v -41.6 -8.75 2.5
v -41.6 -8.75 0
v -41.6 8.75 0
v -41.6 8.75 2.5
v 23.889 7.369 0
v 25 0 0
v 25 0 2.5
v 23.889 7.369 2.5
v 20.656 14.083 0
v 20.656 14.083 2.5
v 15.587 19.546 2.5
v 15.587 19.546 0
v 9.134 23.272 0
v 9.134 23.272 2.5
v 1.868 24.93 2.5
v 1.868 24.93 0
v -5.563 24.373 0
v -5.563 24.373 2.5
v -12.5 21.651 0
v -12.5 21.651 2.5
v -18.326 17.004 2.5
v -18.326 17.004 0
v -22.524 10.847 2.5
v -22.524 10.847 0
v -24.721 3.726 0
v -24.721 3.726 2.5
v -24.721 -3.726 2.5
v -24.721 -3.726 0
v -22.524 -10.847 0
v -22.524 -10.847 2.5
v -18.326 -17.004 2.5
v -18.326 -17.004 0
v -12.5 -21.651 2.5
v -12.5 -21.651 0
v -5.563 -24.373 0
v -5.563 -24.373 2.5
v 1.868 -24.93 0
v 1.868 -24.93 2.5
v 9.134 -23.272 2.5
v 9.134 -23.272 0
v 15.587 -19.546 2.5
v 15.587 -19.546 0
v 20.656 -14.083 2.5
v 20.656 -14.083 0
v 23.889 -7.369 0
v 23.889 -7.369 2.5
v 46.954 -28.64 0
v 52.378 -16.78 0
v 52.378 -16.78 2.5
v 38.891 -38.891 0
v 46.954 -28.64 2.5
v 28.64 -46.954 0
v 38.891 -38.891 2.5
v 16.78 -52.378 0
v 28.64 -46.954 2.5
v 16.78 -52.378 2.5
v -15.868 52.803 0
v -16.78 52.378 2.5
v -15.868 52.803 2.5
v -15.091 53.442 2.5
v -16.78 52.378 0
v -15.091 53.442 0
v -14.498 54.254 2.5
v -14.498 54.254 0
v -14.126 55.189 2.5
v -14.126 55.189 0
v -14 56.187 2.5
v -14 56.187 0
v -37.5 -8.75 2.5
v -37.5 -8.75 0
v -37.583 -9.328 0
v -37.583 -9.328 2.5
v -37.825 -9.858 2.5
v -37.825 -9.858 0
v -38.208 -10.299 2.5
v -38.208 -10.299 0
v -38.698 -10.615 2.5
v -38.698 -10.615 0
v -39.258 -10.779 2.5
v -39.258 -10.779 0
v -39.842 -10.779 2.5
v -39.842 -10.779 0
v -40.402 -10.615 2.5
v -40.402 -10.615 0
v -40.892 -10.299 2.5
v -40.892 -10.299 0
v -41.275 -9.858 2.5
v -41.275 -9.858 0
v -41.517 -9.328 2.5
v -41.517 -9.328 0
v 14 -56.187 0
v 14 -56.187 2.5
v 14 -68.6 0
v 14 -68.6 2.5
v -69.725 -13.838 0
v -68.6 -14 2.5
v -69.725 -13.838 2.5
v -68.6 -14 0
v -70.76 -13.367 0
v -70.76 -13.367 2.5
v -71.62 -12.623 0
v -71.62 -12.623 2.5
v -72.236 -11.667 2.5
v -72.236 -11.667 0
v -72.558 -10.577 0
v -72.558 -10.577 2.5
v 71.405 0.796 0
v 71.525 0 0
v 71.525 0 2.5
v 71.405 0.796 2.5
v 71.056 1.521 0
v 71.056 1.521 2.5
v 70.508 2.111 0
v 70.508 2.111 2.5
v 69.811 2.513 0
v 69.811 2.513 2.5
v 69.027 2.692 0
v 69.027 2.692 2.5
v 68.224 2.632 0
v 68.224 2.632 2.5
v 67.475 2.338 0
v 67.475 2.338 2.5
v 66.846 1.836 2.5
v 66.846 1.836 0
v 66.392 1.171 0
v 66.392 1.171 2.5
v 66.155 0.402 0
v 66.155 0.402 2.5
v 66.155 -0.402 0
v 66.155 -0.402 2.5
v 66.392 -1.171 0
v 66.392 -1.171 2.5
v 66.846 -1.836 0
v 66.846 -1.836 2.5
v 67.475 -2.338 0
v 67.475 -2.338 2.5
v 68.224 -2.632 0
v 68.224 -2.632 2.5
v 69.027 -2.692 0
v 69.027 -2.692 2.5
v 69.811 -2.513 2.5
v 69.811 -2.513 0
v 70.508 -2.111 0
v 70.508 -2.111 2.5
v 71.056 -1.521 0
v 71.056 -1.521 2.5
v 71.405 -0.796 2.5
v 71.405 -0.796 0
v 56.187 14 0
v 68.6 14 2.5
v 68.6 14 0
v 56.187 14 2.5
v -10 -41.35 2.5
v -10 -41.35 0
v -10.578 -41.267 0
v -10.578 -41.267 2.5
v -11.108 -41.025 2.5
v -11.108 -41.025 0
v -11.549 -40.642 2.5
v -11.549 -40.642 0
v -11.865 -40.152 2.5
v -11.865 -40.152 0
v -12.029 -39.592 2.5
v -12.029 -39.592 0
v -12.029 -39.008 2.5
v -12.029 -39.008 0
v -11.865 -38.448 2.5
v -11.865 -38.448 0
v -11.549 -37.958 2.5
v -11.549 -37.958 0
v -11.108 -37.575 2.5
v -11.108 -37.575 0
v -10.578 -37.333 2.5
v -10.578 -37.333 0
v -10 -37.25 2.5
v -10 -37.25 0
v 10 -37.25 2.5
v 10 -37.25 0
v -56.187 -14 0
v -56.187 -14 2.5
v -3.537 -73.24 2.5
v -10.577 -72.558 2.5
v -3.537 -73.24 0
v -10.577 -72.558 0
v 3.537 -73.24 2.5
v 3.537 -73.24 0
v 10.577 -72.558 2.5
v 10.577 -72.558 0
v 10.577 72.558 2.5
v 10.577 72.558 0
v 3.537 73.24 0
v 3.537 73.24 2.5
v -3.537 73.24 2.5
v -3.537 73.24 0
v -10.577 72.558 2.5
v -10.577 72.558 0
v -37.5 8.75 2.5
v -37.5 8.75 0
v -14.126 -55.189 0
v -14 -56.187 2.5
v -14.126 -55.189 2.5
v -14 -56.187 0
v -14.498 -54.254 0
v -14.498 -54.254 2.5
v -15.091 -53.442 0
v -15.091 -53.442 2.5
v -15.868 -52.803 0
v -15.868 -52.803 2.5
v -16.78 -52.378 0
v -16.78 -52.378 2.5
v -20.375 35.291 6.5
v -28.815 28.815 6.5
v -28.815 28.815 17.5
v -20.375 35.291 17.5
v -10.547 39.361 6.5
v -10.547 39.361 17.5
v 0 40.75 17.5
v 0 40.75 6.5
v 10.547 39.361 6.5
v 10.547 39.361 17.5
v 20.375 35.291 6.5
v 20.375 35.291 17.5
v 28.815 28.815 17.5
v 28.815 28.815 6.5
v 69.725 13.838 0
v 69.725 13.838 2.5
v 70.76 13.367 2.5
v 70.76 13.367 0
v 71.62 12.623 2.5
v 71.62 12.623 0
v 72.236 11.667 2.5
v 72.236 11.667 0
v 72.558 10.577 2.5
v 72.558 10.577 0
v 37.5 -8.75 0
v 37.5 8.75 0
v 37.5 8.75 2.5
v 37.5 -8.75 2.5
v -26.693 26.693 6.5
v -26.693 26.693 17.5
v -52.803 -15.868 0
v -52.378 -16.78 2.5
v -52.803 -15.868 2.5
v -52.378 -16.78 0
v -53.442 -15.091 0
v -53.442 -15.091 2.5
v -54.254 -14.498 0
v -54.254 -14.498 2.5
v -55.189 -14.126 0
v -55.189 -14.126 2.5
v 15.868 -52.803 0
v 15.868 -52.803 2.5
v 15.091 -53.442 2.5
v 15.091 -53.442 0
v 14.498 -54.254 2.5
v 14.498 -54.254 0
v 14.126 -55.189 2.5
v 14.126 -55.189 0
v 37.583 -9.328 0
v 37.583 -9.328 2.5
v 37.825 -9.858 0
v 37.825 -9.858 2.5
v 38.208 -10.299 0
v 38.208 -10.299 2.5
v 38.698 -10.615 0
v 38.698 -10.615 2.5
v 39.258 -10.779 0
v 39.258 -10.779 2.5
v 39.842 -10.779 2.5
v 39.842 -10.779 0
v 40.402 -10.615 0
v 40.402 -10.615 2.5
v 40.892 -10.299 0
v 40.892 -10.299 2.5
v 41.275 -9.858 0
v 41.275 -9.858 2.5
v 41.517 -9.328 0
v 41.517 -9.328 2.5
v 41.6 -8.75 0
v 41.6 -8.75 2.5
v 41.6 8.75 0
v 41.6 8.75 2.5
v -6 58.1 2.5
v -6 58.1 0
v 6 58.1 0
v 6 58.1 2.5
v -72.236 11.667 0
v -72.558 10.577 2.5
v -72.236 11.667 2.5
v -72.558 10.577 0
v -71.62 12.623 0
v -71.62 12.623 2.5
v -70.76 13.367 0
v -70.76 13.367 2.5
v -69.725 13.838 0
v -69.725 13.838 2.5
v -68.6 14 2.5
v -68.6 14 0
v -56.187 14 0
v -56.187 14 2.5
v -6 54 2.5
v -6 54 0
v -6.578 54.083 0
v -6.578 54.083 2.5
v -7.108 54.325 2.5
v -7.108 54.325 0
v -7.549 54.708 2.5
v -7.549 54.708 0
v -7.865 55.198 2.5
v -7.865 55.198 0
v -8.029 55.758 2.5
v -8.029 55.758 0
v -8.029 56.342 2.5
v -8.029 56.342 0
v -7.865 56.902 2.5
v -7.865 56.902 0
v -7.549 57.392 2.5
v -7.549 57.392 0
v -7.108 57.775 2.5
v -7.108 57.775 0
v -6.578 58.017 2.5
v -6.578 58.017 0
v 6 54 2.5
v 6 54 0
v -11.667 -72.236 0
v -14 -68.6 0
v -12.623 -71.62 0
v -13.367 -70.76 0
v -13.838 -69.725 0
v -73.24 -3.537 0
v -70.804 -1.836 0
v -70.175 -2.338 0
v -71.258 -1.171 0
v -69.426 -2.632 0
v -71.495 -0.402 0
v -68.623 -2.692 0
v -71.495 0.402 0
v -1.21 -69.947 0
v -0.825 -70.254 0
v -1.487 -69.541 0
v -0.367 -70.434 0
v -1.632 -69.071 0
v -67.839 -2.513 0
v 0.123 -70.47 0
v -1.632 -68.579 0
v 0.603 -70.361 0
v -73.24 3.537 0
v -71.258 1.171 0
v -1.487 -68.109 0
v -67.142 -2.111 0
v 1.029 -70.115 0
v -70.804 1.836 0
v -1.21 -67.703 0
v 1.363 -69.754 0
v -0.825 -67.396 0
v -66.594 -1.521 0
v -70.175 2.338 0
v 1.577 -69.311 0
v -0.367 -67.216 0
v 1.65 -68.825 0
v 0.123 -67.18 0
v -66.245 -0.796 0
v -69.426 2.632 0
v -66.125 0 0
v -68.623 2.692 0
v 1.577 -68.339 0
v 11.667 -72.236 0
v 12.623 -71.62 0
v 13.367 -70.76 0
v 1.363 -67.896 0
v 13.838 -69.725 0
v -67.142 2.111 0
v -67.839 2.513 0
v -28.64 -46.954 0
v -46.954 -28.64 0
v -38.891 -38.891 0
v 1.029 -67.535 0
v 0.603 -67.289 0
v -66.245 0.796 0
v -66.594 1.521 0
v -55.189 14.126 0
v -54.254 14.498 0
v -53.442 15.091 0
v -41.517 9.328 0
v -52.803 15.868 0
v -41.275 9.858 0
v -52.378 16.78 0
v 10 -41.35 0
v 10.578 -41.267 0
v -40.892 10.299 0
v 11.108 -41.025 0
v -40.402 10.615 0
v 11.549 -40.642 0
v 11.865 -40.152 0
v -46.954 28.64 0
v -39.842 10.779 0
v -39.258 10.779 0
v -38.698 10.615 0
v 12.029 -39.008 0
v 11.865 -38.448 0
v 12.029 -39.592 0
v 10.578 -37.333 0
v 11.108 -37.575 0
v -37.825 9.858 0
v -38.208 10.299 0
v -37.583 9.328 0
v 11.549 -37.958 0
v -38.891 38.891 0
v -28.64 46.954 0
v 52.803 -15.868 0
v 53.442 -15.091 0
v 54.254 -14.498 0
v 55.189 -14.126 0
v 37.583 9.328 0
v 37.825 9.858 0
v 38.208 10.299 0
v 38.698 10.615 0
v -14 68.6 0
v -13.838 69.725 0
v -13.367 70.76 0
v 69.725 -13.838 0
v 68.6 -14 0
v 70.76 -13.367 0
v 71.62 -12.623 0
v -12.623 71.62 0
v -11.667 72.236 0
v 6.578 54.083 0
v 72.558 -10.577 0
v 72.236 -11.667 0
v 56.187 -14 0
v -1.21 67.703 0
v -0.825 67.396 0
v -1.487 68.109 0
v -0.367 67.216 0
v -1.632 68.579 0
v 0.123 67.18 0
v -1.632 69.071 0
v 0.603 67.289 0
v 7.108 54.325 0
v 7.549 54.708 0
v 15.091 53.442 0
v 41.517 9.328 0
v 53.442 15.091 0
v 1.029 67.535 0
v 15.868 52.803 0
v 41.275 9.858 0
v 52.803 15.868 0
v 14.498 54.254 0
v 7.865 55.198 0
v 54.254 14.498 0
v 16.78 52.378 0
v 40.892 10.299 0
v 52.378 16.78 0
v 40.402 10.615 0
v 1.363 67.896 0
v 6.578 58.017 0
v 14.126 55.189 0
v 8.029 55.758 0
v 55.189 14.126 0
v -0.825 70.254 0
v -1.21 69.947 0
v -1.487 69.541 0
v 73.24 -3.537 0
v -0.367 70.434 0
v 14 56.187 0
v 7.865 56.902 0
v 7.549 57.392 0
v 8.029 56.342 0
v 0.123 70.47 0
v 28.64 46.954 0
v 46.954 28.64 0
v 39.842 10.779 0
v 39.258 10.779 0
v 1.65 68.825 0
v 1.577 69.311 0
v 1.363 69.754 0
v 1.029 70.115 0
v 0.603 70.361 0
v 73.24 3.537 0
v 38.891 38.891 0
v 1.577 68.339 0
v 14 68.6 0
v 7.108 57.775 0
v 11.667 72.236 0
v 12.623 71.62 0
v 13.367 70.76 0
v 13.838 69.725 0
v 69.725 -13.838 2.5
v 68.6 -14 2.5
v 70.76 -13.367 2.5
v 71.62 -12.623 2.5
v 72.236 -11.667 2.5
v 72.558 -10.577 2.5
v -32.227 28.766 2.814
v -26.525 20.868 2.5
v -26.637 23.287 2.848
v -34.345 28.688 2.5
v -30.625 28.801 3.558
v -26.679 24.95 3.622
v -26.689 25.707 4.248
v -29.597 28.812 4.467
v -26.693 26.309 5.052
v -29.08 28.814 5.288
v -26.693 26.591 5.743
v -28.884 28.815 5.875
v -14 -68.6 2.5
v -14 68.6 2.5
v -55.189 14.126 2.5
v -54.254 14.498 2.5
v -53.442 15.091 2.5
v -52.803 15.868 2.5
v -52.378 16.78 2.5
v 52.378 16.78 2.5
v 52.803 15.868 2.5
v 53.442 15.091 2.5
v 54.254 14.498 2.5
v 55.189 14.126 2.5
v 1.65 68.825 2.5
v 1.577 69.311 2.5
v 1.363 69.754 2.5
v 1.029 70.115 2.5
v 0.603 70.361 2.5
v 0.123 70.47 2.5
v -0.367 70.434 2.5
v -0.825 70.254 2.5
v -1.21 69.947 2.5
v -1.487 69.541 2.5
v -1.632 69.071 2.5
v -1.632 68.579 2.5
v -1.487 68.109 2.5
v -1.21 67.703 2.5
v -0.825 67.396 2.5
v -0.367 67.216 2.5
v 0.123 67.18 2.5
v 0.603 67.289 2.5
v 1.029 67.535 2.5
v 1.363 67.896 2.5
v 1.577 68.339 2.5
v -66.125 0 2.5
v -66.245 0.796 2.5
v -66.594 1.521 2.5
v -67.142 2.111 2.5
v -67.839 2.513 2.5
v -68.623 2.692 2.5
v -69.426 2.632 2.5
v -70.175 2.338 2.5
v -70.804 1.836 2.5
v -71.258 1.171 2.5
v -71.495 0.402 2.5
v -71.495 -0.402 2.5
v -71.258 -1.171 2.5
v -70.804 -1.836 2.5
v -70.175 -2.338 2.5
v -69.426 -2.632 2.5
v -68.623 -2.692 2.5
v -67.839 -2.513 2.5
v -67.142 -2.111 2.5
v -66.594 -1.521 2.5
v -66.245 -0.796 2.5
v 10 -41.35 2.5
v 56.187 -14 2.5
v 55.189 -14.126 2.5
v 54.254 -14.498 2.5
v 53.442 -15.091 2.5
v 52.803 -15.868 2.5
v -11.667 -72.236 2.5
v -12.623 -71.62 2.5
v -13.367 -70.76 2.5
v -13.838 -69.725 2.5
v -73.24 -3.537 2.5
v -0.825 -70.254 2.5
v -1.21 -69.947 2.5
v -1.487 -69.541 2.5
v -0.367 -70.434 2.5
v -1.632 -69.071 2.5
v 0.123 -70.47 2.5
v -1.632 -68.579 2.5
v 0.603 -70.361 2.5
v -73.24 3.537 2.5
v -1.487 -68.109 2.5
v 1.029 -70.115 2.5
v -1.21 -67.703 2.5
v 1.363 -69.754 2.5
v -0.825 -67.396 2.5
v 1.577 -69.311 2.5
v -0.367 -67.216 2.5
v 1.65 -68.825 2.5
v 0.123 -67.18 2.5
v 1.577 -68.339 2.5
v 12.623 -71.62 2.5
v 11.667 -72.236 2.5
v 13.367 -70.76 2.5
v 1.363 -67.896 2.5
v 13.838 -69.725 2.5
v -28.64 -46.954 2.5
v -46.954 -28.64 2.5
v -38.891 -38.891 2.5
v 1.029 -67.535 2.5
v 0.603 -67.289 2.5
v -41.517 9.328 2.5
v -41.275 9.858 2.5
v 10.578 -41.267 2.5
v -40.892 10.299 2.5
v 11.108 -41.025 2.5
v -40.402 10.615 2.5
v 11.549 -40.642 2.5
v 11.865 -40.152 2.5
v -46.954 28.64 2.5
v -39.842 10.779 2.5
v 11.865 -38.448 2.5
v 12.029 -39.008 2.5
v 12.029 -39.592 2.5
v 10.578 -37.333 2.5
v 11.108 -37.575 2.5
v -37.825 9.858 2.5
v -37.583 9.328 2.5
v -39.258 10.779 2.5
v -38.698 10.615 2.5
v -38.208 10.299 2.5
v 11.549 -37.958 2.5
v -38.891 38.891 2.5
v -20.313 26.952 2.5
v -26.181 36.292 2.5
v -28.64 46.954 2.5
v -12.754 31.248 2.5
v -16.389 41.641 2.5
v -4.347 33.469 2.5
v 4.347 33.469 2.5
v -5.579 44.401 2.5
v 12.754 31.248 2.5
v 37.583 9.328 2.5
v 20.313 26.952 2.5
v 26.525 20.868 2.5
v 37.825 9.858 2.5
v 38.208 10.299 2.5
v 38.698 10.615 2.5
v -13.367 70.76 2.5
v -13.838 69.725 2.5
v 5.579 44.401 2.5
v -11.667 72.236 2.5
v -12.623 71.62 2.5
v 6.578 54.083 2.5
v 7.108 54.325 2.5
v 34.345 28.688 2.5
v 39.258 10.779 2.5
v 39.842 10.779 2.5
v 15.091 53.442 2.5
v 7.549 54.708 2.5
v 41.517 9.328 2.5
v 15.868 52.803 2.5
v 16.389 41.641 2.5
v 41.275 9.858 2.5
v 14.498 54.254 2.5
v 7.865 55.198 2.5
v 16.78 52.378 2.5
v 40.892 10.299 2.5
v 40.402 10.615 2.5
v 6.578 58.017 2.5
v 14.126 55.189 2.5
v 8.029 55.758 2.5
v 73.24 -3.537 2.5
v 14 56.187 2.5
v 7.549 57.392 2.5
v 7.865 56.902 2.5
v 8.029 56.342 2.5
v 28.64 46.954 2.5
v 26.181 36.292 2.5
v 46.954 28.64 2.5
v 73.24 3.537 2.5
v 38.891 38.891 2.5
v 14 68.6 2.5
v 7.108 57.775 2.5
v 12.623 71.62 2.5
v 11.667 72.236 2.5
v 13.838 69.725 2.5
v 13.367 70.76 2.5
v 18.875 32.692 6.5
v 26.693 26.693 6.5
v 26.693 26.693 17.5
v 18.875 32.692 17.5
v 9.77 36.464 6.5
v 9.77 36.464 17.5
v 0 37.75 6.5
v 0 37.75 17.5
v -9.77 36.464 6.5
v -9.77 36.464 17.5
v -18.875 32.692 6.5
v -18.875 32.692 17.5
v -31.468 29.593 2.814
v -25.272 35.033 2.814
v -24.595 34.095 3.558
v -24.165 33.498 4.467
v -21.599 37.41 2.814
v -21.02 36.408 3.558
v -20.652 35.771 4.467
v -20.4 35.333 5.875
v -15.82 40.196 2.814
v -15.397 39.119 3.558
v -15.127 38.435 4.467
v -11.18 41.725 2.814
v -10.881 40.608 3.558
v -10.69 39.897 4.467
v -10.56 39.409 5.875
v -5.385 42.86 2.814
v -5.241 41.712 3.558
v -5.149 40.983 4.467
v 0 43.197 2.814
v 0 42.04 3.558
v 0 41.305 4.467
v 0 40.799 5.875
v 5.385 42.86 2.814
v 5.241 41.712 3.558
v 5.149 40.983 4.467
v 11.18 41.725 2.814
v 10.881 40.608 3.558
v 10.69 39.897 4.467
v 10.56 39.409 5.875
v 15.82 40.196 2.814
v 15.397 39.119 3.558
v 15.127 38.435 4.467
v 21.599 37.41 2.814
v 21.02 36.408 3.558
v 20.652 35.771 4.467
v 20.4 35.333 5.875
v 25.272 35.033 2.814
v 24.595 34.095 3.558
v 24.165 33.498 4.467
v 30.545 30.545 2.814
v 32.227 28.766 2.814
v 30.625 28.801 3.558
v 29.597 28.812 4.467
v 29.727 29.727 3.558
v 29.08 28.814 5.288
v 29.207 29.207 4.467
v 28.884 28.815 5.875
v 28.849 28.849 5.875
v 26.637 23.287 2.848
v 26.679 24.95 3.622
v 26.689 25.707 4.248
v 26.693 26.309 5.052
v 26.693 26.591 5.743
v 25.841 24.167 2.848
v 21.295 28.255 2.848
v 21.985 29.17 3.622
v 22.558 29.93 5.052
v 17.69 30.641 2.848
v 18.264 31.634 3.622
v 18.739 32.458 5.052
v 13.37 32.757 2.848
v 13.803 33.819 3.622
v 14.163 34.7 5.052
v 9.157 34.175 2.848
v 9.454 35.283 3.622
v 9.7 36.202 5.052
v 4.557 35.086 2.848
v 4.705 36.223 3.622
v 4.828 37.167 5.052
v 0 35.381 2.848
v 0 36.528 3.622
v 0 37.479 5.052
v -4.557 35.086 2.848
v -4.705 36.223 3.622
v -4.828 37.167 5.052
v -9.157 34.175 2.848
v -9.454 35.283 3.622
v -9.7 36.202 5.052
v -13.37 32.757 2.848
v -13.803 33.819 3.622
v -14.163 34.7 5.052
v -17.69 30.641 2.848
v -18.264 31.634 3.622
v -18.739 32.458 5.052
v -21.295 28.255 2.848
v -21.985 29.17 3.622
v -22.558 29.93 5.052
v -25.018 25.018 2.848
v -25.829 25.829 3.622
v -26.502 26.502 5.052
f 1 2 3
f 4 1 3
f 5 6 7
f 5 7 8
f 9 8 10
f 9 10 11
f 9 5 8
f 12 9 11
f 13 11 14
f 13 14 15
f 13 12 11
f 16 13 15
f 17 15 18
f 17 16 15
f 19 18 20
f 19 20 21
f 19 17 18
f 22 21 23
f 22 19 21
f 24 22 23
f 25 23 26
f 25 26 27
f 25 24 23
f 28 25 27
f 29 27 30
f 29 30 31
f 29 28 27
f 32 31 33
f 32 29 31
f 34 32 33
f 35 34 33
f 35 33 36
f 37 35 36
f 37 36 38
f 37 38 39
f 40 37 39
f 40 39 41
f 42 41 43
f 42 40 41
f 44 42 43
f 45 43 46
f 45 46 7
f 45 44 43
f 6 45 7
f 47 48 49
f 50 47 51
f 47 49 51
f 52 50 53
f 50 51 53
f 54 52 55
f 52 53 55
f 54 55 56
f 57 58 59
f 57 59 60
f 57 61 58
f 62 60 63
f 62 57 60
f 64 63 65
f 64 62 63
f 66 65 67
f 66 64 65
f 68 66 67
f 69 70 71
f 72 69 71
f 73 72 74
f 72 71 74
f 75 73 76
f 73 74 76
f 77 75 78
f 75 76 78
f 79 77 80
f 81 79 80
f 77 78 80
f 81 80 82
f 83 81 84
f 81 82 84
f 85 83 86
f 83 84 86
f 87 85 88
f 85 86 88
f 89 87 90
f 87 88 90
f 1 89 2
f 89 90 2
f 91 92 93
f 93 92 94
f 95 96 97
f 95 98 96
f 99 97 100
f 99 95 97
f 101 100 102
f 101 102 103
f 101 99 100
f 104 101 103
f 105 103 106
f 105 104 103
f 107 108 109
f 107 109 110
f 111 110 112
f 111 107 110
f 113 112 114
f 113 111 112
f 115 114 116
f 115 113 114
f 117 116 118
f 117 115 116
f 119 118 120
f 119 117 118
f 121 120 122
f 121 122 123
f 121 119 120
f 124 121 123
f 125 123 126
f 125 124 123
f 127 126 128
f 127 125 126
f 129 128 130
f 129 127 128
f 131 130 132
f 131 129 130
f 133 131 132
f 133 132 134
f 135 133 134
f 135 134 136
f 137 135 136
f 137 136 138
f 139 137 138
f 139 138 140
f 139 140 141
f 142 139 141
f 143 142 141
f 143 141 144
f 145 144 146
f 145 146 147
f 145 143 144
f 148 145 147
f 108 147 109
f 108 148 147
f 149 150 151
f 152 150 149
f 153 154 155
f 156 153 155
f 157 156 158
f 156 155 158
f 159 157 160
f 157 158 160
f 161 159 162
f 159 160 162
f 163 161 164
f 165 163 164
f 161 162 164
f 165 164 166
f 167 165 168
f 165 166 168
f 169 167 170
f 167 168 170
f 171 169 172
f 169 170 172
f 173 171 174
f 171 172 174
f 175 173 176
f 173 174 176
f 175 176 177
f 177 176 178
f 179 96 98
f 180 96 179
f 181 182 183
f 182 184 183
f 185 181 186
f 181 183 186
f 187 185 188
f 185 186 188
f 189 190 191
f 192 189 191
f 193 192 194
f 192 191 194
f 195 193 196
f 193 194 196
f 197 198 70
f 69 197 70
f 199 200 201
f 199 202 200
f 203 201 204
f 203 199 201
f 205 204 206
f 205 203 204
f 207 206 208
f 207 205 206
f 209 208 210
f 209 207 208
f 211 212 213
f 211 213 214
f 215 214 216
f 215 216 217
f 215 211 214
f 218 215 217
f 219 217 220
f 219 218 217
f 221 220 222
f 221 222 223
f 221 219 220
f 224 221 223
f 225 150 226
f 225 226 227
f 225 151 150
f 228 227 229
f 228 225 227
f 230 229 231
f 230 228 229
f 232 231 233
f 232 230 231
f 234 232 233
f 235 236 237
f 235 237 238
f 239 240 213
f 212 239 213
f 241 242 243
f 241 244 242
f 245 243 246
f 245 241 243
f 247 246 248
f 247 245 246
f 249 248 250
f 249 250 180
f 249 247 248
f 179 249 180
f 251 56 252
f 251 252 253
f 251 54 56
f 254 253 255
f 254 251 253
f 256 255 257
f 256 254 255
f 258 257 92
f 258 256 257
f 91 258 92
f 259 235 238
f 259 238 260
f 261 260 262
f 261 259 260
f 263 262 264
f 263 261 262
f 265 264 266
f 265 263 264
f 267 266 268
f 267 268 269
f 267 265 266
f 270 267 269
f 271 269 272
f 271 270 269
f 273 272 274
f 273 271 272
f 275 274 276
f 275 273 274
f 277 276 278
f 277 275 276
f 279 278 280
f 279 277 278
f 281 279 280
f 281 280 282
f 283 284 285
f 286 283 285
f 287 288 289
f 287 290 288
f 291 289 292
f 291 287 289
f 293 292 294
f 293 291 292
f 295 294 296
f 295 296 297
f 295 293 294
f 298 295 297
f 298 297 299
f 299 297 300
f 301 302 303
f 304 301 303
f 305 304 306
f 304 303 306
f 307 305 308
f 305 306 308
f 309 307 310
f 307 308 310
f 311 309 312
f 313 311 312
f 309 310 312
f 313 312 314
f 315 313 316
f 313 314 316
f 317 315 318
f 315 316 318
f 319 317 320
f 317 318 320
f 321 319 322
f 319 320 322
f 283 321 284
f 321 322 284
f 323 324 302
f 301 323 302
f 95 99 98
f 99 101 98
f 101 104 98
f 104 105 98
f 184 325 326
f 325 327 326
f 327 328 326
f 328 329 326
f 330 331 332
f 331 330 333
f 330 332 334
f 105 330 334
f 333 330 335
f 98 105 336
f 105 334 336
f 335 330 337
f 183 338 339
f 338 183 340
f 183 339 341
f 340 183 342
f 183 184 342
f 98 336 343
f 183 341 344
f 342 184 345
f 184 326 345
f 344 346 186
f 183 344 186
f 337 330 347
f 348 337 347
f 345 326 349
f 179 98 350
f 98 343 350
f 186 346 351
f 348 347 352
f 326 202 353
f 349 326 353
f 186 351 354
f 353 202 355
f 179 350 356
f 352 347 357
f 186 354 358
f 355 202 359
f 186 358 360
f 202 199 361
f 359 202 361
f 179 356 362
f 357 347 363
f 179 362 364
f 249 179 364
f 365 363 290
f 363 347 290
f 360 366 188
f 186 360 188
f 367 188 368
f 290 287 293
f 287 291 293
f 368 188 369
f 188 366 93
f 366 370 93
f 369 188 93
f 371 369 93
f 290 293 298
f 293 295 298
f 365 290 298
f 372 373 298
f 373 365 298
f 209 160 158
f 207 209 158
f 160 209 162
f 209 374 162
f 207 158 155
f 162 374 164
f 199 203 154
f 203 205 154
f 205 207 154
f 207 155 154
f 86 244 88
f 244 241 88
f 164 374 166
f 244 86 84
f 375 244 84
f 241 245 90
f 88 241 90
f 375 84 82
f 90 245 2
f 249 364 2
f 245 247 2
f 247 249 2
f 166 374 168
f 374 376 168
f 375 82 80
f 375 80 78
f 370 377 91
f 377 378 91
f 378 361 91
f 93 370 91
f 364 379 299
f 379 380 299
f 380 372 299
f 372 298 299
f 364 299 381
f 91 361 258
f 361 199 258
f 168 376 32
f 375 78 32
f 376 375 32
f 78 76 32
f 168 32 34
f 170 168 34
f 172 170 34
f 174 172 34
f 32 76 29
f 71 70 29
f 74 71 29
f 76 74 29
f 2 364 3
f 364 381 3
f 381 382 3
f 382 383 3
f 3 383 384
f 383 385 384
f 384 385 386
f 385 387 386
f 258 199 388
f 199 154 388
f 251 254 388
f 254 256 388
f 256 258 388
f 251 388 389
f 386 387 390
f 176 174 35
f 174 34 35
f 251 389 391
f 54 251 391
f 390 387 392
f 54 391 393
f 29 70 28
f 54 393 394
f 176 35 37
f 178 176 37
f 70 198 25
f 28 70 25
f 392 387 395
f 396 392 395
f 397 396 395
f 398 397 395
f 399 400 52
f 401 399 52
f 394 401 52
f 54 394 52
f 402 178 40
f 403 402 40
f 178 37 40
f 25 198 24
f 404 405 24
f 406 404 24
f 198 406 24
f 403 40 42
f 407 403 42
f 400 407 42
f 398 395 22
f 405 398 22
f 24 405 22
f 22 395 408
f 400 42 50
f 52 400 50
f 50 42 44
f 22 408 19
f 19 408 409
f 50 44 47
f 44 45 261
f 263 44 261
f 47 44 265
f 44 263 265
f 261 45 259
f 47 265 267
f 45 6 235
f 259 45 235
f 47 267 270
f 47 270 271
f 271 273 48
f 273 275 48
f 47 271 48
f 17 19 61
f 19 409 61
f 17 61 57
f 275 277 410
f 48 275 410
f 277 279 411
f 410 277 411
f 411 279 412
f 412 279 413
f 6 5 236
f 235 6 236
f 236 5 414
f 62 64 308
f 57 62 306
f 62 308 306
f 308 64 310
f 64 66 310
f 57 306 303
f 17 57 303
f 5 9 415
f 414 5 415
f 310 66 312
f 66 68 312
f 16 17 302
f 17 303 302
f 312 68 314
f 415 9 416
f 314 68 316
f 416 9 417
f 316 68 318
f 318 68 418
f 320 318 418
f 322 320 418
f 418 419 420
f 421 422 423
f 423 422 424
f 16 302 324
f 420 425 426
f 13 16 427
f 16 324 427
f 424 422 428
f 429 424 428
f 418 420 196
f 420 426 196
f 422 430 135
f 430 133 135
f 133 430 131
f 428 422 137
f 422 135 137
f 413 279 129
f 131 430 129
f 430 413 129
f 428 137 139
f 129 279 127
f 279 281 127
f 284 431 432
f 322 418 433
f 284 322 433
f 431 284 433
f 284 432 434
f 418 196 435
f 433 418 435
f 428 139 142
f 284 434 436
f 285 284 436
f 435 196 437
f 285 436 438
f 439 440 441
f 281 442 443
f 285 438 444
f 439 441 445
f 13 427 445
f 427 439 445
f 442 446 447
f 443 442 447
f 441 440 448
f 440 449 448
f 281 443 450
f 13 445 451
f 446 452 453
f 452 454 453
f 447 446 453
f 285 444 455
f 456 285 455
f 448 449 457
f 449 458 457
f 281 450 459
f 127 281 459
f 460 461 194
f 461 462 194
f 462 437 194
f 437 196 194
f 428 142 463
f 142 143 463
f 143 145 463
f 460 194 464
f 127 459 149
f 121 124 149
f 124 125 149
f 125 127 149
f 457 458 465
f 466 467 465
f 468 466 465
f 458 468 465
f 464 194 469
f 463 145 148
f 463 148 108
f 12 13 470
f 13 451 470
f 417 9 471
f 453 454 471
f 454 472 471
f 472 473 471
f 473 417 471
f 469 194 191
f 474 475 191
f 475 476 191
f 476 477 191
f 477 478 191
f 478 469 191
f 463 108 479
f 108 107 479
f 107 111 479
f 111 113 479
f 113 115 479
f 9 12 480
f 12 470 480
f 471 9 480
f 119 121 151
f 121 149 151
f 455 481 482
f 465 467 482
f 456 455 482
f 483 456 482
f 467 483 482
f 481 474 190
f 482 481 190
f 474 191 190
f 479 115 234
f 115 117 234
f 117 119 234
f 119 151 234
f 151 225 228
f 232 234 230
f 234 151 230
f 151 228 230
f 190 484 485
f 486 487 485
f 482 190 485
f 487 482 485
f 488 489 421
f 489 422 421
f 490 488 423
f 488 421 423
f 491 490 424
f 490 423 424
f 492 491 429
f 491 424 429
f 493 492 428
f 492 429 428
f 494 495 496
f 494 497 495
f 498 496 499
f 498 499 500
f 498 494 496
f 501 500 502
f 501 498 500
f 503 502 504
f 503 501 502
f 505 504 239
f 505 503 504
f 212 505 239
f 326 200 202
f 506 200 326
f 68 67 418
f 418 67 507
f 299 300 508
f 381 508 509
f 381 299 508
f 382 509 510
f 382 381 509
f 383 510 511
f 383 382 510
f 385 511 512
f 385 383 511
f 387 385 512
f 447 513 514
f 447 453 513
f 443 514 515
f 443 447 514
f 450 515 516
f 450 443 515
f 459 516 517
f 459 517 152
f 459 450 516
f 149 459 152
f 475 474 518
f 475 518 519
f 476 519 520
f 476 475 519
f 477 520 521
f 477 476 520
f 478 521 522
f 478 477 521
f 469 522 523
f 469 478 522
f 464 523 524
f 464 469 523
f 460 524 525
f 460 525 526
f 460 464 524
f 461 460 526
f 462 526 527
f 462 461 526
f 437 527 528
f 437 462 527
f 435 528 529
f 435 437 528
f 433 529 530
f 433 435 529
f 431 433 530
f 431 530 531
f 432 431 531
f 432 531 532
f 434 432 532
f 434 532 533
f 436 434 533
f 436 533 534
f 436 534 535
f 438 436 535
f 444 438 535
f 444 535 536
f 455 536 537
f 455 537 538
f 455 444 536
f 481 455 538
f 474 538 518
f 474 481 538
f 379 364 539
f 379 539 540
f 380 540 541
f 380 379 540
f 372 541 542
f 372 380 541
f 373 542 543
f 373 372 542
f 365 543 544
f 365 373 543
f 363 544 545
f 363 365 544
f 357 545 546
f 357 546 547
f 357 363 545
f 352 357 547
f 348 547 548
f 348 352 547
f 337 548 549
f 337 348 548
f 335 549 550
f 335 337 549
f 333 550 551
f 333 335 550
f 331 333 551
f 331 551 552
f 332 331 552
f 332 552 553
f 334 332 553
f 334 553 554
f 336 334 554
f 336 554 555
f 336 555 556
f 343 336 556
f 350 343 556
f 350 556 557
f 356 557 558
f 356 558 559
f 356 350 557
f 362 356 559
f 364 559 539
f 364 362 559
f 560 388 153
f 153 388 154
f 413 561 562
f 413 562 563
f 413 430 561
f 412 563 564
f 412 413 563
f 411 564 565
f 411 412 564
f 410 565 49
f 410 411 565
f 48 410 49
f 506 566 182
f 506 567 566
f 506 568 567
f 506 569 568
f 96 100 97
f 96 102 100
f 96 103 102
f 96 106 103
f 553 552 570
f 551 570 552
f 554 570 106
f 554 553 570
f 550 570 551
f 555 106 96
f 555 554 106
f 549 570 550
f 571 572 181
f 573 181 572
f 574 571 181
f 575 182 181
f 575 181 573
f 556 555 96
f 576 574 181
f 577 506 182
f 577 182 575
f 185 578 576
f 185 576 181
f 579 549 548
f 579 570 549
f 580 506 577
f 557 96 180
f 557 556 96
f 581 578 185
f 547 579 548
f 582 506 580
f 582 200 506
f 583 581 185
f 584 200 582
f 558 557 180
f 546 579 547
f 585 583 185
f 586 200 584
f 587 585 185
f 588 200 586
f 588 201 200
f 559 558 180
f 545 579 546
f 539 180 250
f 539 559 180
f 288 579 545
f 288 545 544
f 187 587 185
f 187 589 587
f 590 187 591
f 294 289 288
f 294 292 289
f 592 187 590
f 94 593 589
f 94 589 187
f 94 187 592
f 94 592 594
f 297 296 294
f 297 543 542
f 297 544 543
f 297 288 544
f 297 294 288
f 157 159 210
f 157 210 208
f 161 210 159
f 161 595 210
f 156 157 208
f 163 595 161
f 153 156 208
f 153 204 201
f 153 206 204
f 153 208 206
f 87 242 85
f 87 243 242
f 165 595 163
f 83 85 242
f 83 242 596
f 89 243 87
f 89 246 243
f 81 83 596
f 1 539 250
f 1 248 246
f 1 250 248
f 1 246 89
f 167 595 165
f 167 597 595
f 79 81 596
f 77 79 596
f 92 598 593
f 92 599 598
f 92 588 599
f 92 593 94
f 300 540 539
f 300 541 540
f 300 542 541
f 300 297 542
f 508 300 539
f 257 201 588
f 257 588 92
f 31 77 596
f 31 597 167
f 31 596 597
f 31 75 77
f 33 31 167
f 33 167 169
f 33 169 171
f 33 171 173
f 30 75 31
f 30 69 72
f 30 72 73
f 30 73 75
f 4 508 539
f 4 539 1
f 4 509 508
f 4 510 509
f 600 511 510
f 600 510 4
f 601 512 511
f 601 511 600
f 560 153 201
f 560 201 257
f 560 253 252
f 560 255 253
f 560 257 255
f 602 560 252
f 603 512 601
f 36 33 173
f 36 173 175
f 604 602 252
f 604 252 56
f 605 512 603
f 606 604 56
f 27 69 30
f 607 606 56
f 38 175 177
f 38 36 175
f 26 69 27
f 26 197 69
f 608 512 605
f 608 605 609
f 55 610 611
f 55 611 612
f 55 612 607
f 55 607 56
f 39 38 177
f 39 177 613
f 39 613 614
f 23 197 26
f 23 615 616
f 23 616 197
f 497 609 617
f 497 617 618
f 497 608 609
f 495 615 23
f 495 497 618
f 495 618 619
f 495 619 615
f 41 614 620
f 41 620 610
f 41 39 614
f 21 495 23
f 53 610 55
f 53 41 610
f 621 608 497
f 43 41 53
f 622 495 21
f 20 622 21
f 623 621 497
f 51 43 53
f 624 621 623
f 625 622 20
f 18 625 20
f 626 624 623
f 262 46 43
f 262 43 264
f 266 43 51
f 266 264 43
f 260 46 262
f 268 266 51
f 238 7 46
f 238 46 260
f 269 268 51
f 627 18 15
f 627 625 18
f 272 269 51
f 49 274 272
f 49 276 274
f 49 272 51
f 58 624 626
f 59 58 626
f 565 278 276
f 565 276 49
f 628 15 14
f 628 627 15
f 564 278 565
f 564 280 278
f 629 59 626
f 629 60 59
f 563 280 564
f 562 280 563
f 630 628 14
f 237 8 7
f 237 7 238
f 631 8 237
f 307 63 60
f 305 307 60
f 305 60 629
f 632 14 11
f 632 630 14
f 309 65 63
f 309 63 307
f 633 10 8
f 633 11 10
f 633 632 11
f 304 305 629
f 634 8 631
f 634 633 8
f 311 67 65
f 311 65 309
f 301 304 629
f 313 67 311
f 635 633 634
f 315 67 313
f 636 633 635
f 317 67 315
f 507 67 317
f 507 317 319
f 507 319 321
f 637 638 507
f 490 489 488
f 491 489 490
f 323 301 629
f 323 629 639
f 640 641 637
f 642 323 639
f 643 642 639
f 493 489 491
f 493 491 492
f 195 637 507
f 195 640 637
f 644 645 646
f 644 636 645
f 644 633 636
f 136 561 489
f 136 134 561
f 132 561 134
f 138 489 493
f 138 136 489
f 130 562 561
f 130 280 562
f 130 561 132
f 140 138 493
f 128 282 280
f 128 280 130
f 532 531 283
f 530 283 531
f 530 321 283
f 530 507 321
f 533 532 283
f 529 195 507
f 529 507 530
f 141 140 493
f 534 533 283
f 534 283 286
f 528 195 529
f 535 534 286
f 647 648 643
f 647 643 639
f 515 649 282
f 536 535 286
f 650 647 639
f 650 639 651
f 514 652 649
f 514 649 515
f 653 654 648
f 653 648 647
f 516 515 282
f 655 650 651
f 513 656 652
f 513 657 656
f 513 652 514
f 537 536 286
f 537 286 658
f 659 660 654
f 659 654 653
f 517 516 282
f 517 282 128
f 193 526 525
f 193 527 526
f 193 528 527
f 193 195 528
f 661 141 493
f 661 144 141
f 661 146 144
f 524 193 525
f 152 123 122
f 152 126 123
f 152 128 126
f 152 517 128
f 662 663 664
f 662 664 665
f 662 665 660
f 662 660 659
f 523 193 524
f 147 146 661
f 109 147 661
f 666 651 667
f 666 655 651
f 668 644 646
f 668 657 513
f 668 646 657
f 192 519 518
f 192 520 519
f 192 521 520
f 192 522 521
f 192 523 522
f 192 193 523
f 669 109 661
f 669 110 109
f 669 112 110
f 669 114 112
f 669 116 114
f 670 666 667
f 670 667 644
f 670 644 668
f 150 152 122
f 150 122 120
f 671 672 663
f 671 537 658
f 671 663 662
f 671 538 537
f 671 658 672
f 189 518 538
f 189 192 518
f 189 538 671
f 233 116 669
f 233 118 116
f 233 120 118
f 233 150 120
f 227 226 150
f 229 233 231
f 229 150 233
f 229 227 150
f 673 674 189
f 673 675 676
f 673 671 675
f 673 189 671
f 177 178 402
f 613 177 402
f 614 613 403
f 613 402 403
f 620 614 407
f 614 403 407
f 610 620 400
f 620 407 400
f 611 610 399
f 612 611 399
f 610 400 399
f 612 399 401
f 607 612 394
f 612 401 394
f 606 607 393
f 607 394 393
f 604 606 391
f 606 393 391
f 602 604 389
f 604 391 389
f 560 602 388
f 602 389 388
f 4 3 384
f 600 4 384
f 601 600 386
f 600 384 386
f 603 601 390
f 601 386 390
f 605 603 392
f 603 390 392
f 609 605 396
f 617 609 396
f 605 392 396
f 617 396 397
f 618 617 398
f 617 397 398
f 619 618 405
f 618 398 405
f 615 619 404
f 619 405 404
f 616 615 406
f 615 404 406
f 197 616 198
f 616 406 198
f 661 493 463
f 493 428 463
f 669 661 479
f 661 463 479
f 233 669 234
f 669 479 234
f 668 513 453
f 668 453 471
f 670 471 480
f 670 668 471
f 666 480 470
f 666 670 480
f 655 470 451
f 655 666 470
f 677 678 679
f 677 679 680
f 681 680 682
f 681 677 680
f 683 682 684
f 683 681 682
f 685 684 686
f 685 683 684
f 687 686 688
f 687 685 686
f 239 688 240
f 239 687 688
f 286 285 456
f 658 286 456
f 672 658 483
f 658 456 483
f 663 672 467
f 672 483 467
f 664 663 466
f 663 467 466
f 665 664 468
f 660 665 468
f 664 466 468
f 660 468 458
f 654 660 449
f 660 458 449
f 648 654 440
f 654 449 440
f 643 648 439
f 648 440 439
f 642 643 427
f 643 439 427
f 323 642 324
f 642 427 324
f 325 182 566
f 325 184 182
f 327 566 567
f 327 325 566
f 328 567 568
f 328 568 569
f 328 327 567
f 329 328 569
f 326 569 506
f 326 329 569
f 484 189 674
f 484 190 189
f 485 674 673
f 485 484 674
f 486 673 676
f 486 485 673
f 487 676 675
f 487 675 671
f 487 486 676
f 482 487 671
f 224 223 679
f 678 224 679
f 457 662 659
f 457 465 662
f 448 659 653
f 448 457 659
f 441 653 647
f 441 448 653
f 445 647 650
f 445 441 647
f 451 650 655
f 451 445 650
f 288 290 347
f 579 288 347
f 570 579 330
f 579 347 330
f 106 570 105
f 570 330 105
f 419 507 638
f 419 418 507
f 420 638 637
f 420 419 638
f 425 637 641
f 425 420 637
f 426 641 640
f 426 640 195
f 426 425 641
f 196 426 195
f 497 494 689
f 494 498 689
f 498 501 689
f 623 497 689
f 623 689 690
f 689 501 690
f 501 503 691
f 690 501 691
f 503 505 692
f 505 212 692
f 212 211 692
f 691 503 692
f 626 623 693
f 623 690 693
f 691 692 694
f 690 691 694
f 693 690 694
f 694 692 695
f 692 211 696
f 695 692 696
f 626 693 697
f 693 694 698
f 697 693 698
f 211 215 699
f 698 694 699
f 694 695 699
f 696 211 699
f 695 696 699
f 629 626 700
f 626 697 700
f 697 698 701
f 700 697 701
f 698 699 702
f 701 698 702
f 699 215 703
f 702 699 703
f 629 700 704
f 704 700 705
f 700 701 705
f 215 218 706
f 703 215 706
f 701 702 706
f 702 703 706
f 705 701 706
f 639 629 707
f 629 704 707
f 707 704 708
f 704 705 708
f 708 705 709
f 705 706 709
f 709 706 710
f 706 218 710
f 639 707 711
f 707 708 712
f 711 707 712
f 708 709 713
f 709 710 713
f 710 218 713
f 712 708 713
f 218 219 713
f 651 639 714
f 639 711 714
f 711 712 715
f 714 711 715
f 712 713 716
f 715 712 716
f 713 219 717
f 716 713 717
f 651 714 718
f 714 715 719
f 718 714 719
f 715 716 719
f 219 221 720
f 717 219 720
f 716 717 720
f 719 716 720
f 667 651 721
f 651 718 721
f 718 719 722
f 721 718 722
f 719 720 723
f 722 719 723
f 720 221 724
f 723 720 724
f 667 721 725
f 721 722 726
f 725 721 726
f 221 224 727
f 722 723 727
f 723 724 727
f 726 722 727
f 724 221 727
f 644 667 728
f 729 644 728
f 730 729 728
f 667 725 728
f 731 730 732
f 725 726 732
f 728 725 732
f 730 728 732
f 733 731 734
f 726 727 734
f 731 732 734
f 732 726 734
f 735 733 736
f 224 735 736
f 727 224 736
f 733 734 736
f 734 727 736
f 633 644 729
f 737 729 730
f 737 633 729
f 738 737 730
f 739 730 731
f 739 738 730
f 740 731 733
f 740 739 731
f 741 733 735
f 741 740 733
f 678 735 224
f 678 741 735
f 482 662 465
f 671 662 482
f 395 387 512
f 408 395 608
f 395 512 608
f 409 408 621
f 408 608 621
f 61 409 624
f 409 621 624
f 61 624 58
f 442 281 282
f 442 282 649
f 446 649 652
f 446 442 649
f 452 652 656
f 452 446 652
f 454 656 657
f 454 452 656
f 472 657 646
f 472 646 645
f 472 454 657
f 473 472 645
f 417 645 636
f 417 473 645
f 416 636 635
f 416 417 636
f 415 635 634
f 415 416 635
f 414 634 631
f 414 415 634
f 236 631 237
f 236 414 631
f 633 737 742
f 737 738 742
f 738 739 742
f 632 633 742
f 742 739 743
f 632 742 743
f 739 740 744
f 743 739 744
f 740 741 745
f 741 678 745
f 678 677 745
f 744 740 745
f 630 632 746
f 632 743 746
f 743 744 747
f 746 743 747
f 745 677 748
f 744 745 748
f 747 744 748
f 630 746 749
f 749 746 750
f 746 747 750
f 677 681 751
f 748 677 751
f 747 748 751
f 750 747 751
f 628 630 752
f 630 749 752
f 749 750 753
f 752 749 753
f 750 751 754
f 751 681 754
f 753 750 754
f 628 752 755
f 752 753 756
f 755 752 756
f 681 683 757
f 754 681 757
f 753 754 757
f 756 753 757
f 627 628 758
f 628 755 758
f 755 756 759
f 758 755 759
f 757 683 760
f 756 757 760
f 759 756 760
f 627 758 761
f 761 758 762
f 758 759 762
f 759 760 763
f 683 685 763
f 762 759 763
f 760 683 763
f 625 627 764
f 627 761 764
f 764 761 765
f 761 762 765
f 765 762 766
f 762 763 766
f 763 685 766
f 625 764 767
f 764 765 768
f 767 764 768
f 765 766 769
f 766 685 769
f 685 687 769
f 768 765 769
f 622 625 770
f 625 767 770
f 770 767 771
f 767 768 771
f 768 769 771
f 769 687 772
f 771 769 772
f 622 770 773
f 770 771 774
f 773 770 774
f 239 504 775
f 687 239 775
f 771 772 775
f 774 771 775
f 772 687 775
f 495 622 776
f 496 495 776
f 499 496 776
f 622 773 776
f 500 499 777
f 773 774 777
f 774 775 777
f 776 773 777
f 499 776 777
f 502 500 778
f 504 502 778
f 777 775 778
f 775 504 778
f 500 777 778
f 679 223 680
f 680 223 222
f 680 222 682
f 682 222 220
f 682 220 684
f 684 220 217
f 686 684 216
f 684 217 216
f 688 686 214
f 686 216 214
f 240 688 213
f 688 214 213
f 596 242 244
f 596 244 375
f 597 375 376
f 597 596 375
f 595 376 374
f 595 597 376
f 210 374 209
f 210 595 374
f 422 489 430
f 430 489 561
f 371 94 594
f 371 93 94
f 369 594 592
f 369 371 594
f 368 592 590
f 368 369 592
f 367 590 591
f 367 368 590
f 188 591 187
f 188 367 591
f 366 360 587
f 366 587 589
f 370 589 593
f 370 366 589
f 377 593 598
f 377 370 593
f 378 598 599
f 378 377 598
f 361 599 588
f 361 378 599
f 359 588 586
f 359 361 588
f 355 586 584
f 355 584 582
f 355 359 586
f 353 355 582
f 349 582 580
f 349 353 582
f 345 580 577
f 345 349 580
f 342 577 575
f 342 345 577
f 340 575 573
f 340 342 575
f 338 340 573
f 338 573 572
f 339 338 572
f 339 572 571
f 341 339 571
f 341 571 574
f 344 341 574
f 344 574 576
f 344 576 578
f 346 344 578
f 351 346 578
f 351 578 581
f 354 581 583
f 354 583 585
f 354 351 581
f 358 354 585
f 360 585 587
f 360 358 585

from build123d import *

# Parameters (mm, degrees)
SKETCH1_R           = 73.325
SKETCH1_R_2         = 1.65
SKETCH1_R_3         = 2.7
SKETCH1_R_4         = 25
BOSS_EXTRUDE1_DEPTH = 2.5
BOSS_EXTRUDE2_DEPTH = 15
FILLET2_R           = 4
CUT_EXTRUDE1_DEPTH  = 105.776482333
FILLET1_R           = 4


with BuildPart() as part:
    # Sketch1 → Boss-Extrude1 (new body)
    with BuildSketch(Plane.XY):
        Circle(SKETCH1_R)
        with Locations((0, 68.825)):
            Circle(SKETCH1_R_2, mode=Mode.SUBTRACT)
        with Locations((-68.825, 0)):
            Circle(SKETCH1_R_3, mode=Mode.SUBTRACT)
        Circle(SKETCH1_R_4, mode=Mode.SUBTRACT)
        with Locations((0, -68.825)):
            Circle(SKETCH1_R_2, mode=Mode.SUBTRACT)
        with Locations((68.825, 0)):
            Circle(SKETCH1_R_3, mode=Mode.SUBTRACT)
        with BuildLine():
            Line((-37.5, 8.75), (-37.5, -8.75))
            ThreePointArc((-37.5, -8.75), (-39.55, -10.8), (-41.6, -8.75))
            Line((-41.6, -8.75), (-41.6, 8.75))
            ThreePointArc((-41.6, 8.75), (-39.55, 10.8), (-37.5, 8.75))
        make_face(mode=Mode.SUBTRACT)
        with BuildLine():
            Line((10, -41.35), (-10, -41.35))
            ThreePointArc((-10, -41.35), (-12.05, -39.3), (-10, -37.25))
            Line((-10, -37.25), (10, -37.25))
            ThreePointArc((10, -37.25), (12.05, -39.3), (10, -41.35))
        make_face(mode=Mode.SUBTRACT)
        with BuildLine():
            Line((41.6, -8.75), (41.6, 8.75))
            ThreePointArc((41.6, 8.75), (39.55, 10.8), (37.5, 8.75))
            Line((37.5, 8.75), (37.5, -8.75))
            ThreePointArc((37.5, -8.75), (39.55, -10.8), (41.6, -8.75))
        make_face(mode=Mode.SUBTRACT)
        with BuildLine():
            Line((-6, 58.1), (6, 58.1))
            ThreePointArc((6, 58.1), (8.05, 56.05), (6, 54))
            Line((6, 54), (-6, 54))
            ThreePointArc((-6, 54), (-8.05, 56.05), (-6, 58.1))
        make_face(mode=Mode.SUBTRACT)
    extrude(amount=BOSS_EXTRUDE1_DEPTH)

    # Sketch2 → Boss-Extrude2 (add)
    with BuildSketch(Plane.XY.offset(2.5)):
        with BuildLine():
            Line((-26.69328099, 26.69328099), (-28.814601333, 28.814601333))
            ThreePointArc((-28.814601333, 28.814601333), (0, 40.75), (28.814601333, 28.814601333))
            Line((28.814601333, 28.814601333), (26.69328099, 26.69328099))
            ThreePointArc((26.69328099, 26.69328099), (0, 37.75), (-26.69328099, 26.69328099))
        make_face()
    extrude(amount=BOSS_EXTRUDE2_DEPTH)

    # Fillet2
    fillet2_edges = [part.edges().sort_by_distance(p)[0] for p in [
        (0, 37.75, 2.5),
        (27.753941162, 27.753941162, 2.5),
        (0, 40.75, 2.5),
        (-27.753941162, 27.753941162, 2.5),
    ]]
    fillet(fillet2_edges, radius=FILLET2_R)

    # Sketch4 → Cut-Extrude1 (cut, through all)
    with BuildSketch(Plane.XY.offset(2.5)):
        with BuildLine():
            Line((71.976076755, 14), (53.188344588, 14))
            ThreePointArc((53.188344588, 14), (38.890872965, 38.890872965), (14, 53.188344588))
            Line((14, 53.188344588), (14, 71.976076755))
            ThreePointArc((14, 71.976076755), (51.848604731, 51.848604731), (71.976076755, 14))
        make_face()
        with BuildLine():
            Line((-71.976076755, -14), (-53.188344588, -14))
            ThreePointArc((-53.188344588, -14), (-38.890872965, -38.890872965), (-14, -53.188344588))
            Line((-14, -53.188344588), (-14, -71.976076755))
            ThreePointArc((-14, -71.976076755), (-51.848604731, -51.848604731), (-71.976076755, -14))
        make_face()
        with BuildLine():
            Line((71.976076755, -14), (53.188344588, -14))
            ThreePointArc((53.188344588, -14), (38.890872965, -38.890872965), (14, -53.188344588))
            Line((14, -53.188344588), (14, -71.976076755))
            ThreePointArc((14, -71.976076755), (51.848604731, -51.848604731), (71.976076755, -14))
        make_face()
        with BuildLine():
            Line((-71.976076755, 14), (-53.188344588, 14))
            ThreePointArc((-53.188344588, 14), (-38.890872965, 38.890872965), (-14, 53.188344588))
            Line((-14, 53.188344588), (-14, 71.976076755))
            ThreePointArc((-14, 71.976076755), (-51.848604731, 51.848604731), (-71.976076755, 14))
        make_face()
    extrude(amount=-CUT_EXTRUDE1_DEPTH, mode=Mode.SUBTRACT)

    # Fillet1
    fillet1_edges = [part.edges().sort_by_distance(p)[0] for p in [
        (-14, 53.188344588, 1.25),
        (-53.188344588, 14, 1.25),
        (-71.976076755, 14, 1.25),
        (-14, 71.976076755, 1.25),
        (14, 71.976076755, 1.25),
        (71.976076755, 14, 1.25),
        (53.188344588, 14, 1.25),
        (14, 53.188344588, 1.25),
        (14, -53.188344588, 1.25),
        (53.188344588, -14, 1.25),
        (71.976076755, -14, 1.25),
        (14, -71.976076755, 1.25),
        (-14, -71.976076755, 1.25),
        (-71.976076755, -14, 1.25),
        (-53.188344588, -14, 1.25),
        (-14, -53.188344588, 1.25),
    ]]
    fillet(fillet1_edges, radius=FILLET1_R)


solid = part.part
